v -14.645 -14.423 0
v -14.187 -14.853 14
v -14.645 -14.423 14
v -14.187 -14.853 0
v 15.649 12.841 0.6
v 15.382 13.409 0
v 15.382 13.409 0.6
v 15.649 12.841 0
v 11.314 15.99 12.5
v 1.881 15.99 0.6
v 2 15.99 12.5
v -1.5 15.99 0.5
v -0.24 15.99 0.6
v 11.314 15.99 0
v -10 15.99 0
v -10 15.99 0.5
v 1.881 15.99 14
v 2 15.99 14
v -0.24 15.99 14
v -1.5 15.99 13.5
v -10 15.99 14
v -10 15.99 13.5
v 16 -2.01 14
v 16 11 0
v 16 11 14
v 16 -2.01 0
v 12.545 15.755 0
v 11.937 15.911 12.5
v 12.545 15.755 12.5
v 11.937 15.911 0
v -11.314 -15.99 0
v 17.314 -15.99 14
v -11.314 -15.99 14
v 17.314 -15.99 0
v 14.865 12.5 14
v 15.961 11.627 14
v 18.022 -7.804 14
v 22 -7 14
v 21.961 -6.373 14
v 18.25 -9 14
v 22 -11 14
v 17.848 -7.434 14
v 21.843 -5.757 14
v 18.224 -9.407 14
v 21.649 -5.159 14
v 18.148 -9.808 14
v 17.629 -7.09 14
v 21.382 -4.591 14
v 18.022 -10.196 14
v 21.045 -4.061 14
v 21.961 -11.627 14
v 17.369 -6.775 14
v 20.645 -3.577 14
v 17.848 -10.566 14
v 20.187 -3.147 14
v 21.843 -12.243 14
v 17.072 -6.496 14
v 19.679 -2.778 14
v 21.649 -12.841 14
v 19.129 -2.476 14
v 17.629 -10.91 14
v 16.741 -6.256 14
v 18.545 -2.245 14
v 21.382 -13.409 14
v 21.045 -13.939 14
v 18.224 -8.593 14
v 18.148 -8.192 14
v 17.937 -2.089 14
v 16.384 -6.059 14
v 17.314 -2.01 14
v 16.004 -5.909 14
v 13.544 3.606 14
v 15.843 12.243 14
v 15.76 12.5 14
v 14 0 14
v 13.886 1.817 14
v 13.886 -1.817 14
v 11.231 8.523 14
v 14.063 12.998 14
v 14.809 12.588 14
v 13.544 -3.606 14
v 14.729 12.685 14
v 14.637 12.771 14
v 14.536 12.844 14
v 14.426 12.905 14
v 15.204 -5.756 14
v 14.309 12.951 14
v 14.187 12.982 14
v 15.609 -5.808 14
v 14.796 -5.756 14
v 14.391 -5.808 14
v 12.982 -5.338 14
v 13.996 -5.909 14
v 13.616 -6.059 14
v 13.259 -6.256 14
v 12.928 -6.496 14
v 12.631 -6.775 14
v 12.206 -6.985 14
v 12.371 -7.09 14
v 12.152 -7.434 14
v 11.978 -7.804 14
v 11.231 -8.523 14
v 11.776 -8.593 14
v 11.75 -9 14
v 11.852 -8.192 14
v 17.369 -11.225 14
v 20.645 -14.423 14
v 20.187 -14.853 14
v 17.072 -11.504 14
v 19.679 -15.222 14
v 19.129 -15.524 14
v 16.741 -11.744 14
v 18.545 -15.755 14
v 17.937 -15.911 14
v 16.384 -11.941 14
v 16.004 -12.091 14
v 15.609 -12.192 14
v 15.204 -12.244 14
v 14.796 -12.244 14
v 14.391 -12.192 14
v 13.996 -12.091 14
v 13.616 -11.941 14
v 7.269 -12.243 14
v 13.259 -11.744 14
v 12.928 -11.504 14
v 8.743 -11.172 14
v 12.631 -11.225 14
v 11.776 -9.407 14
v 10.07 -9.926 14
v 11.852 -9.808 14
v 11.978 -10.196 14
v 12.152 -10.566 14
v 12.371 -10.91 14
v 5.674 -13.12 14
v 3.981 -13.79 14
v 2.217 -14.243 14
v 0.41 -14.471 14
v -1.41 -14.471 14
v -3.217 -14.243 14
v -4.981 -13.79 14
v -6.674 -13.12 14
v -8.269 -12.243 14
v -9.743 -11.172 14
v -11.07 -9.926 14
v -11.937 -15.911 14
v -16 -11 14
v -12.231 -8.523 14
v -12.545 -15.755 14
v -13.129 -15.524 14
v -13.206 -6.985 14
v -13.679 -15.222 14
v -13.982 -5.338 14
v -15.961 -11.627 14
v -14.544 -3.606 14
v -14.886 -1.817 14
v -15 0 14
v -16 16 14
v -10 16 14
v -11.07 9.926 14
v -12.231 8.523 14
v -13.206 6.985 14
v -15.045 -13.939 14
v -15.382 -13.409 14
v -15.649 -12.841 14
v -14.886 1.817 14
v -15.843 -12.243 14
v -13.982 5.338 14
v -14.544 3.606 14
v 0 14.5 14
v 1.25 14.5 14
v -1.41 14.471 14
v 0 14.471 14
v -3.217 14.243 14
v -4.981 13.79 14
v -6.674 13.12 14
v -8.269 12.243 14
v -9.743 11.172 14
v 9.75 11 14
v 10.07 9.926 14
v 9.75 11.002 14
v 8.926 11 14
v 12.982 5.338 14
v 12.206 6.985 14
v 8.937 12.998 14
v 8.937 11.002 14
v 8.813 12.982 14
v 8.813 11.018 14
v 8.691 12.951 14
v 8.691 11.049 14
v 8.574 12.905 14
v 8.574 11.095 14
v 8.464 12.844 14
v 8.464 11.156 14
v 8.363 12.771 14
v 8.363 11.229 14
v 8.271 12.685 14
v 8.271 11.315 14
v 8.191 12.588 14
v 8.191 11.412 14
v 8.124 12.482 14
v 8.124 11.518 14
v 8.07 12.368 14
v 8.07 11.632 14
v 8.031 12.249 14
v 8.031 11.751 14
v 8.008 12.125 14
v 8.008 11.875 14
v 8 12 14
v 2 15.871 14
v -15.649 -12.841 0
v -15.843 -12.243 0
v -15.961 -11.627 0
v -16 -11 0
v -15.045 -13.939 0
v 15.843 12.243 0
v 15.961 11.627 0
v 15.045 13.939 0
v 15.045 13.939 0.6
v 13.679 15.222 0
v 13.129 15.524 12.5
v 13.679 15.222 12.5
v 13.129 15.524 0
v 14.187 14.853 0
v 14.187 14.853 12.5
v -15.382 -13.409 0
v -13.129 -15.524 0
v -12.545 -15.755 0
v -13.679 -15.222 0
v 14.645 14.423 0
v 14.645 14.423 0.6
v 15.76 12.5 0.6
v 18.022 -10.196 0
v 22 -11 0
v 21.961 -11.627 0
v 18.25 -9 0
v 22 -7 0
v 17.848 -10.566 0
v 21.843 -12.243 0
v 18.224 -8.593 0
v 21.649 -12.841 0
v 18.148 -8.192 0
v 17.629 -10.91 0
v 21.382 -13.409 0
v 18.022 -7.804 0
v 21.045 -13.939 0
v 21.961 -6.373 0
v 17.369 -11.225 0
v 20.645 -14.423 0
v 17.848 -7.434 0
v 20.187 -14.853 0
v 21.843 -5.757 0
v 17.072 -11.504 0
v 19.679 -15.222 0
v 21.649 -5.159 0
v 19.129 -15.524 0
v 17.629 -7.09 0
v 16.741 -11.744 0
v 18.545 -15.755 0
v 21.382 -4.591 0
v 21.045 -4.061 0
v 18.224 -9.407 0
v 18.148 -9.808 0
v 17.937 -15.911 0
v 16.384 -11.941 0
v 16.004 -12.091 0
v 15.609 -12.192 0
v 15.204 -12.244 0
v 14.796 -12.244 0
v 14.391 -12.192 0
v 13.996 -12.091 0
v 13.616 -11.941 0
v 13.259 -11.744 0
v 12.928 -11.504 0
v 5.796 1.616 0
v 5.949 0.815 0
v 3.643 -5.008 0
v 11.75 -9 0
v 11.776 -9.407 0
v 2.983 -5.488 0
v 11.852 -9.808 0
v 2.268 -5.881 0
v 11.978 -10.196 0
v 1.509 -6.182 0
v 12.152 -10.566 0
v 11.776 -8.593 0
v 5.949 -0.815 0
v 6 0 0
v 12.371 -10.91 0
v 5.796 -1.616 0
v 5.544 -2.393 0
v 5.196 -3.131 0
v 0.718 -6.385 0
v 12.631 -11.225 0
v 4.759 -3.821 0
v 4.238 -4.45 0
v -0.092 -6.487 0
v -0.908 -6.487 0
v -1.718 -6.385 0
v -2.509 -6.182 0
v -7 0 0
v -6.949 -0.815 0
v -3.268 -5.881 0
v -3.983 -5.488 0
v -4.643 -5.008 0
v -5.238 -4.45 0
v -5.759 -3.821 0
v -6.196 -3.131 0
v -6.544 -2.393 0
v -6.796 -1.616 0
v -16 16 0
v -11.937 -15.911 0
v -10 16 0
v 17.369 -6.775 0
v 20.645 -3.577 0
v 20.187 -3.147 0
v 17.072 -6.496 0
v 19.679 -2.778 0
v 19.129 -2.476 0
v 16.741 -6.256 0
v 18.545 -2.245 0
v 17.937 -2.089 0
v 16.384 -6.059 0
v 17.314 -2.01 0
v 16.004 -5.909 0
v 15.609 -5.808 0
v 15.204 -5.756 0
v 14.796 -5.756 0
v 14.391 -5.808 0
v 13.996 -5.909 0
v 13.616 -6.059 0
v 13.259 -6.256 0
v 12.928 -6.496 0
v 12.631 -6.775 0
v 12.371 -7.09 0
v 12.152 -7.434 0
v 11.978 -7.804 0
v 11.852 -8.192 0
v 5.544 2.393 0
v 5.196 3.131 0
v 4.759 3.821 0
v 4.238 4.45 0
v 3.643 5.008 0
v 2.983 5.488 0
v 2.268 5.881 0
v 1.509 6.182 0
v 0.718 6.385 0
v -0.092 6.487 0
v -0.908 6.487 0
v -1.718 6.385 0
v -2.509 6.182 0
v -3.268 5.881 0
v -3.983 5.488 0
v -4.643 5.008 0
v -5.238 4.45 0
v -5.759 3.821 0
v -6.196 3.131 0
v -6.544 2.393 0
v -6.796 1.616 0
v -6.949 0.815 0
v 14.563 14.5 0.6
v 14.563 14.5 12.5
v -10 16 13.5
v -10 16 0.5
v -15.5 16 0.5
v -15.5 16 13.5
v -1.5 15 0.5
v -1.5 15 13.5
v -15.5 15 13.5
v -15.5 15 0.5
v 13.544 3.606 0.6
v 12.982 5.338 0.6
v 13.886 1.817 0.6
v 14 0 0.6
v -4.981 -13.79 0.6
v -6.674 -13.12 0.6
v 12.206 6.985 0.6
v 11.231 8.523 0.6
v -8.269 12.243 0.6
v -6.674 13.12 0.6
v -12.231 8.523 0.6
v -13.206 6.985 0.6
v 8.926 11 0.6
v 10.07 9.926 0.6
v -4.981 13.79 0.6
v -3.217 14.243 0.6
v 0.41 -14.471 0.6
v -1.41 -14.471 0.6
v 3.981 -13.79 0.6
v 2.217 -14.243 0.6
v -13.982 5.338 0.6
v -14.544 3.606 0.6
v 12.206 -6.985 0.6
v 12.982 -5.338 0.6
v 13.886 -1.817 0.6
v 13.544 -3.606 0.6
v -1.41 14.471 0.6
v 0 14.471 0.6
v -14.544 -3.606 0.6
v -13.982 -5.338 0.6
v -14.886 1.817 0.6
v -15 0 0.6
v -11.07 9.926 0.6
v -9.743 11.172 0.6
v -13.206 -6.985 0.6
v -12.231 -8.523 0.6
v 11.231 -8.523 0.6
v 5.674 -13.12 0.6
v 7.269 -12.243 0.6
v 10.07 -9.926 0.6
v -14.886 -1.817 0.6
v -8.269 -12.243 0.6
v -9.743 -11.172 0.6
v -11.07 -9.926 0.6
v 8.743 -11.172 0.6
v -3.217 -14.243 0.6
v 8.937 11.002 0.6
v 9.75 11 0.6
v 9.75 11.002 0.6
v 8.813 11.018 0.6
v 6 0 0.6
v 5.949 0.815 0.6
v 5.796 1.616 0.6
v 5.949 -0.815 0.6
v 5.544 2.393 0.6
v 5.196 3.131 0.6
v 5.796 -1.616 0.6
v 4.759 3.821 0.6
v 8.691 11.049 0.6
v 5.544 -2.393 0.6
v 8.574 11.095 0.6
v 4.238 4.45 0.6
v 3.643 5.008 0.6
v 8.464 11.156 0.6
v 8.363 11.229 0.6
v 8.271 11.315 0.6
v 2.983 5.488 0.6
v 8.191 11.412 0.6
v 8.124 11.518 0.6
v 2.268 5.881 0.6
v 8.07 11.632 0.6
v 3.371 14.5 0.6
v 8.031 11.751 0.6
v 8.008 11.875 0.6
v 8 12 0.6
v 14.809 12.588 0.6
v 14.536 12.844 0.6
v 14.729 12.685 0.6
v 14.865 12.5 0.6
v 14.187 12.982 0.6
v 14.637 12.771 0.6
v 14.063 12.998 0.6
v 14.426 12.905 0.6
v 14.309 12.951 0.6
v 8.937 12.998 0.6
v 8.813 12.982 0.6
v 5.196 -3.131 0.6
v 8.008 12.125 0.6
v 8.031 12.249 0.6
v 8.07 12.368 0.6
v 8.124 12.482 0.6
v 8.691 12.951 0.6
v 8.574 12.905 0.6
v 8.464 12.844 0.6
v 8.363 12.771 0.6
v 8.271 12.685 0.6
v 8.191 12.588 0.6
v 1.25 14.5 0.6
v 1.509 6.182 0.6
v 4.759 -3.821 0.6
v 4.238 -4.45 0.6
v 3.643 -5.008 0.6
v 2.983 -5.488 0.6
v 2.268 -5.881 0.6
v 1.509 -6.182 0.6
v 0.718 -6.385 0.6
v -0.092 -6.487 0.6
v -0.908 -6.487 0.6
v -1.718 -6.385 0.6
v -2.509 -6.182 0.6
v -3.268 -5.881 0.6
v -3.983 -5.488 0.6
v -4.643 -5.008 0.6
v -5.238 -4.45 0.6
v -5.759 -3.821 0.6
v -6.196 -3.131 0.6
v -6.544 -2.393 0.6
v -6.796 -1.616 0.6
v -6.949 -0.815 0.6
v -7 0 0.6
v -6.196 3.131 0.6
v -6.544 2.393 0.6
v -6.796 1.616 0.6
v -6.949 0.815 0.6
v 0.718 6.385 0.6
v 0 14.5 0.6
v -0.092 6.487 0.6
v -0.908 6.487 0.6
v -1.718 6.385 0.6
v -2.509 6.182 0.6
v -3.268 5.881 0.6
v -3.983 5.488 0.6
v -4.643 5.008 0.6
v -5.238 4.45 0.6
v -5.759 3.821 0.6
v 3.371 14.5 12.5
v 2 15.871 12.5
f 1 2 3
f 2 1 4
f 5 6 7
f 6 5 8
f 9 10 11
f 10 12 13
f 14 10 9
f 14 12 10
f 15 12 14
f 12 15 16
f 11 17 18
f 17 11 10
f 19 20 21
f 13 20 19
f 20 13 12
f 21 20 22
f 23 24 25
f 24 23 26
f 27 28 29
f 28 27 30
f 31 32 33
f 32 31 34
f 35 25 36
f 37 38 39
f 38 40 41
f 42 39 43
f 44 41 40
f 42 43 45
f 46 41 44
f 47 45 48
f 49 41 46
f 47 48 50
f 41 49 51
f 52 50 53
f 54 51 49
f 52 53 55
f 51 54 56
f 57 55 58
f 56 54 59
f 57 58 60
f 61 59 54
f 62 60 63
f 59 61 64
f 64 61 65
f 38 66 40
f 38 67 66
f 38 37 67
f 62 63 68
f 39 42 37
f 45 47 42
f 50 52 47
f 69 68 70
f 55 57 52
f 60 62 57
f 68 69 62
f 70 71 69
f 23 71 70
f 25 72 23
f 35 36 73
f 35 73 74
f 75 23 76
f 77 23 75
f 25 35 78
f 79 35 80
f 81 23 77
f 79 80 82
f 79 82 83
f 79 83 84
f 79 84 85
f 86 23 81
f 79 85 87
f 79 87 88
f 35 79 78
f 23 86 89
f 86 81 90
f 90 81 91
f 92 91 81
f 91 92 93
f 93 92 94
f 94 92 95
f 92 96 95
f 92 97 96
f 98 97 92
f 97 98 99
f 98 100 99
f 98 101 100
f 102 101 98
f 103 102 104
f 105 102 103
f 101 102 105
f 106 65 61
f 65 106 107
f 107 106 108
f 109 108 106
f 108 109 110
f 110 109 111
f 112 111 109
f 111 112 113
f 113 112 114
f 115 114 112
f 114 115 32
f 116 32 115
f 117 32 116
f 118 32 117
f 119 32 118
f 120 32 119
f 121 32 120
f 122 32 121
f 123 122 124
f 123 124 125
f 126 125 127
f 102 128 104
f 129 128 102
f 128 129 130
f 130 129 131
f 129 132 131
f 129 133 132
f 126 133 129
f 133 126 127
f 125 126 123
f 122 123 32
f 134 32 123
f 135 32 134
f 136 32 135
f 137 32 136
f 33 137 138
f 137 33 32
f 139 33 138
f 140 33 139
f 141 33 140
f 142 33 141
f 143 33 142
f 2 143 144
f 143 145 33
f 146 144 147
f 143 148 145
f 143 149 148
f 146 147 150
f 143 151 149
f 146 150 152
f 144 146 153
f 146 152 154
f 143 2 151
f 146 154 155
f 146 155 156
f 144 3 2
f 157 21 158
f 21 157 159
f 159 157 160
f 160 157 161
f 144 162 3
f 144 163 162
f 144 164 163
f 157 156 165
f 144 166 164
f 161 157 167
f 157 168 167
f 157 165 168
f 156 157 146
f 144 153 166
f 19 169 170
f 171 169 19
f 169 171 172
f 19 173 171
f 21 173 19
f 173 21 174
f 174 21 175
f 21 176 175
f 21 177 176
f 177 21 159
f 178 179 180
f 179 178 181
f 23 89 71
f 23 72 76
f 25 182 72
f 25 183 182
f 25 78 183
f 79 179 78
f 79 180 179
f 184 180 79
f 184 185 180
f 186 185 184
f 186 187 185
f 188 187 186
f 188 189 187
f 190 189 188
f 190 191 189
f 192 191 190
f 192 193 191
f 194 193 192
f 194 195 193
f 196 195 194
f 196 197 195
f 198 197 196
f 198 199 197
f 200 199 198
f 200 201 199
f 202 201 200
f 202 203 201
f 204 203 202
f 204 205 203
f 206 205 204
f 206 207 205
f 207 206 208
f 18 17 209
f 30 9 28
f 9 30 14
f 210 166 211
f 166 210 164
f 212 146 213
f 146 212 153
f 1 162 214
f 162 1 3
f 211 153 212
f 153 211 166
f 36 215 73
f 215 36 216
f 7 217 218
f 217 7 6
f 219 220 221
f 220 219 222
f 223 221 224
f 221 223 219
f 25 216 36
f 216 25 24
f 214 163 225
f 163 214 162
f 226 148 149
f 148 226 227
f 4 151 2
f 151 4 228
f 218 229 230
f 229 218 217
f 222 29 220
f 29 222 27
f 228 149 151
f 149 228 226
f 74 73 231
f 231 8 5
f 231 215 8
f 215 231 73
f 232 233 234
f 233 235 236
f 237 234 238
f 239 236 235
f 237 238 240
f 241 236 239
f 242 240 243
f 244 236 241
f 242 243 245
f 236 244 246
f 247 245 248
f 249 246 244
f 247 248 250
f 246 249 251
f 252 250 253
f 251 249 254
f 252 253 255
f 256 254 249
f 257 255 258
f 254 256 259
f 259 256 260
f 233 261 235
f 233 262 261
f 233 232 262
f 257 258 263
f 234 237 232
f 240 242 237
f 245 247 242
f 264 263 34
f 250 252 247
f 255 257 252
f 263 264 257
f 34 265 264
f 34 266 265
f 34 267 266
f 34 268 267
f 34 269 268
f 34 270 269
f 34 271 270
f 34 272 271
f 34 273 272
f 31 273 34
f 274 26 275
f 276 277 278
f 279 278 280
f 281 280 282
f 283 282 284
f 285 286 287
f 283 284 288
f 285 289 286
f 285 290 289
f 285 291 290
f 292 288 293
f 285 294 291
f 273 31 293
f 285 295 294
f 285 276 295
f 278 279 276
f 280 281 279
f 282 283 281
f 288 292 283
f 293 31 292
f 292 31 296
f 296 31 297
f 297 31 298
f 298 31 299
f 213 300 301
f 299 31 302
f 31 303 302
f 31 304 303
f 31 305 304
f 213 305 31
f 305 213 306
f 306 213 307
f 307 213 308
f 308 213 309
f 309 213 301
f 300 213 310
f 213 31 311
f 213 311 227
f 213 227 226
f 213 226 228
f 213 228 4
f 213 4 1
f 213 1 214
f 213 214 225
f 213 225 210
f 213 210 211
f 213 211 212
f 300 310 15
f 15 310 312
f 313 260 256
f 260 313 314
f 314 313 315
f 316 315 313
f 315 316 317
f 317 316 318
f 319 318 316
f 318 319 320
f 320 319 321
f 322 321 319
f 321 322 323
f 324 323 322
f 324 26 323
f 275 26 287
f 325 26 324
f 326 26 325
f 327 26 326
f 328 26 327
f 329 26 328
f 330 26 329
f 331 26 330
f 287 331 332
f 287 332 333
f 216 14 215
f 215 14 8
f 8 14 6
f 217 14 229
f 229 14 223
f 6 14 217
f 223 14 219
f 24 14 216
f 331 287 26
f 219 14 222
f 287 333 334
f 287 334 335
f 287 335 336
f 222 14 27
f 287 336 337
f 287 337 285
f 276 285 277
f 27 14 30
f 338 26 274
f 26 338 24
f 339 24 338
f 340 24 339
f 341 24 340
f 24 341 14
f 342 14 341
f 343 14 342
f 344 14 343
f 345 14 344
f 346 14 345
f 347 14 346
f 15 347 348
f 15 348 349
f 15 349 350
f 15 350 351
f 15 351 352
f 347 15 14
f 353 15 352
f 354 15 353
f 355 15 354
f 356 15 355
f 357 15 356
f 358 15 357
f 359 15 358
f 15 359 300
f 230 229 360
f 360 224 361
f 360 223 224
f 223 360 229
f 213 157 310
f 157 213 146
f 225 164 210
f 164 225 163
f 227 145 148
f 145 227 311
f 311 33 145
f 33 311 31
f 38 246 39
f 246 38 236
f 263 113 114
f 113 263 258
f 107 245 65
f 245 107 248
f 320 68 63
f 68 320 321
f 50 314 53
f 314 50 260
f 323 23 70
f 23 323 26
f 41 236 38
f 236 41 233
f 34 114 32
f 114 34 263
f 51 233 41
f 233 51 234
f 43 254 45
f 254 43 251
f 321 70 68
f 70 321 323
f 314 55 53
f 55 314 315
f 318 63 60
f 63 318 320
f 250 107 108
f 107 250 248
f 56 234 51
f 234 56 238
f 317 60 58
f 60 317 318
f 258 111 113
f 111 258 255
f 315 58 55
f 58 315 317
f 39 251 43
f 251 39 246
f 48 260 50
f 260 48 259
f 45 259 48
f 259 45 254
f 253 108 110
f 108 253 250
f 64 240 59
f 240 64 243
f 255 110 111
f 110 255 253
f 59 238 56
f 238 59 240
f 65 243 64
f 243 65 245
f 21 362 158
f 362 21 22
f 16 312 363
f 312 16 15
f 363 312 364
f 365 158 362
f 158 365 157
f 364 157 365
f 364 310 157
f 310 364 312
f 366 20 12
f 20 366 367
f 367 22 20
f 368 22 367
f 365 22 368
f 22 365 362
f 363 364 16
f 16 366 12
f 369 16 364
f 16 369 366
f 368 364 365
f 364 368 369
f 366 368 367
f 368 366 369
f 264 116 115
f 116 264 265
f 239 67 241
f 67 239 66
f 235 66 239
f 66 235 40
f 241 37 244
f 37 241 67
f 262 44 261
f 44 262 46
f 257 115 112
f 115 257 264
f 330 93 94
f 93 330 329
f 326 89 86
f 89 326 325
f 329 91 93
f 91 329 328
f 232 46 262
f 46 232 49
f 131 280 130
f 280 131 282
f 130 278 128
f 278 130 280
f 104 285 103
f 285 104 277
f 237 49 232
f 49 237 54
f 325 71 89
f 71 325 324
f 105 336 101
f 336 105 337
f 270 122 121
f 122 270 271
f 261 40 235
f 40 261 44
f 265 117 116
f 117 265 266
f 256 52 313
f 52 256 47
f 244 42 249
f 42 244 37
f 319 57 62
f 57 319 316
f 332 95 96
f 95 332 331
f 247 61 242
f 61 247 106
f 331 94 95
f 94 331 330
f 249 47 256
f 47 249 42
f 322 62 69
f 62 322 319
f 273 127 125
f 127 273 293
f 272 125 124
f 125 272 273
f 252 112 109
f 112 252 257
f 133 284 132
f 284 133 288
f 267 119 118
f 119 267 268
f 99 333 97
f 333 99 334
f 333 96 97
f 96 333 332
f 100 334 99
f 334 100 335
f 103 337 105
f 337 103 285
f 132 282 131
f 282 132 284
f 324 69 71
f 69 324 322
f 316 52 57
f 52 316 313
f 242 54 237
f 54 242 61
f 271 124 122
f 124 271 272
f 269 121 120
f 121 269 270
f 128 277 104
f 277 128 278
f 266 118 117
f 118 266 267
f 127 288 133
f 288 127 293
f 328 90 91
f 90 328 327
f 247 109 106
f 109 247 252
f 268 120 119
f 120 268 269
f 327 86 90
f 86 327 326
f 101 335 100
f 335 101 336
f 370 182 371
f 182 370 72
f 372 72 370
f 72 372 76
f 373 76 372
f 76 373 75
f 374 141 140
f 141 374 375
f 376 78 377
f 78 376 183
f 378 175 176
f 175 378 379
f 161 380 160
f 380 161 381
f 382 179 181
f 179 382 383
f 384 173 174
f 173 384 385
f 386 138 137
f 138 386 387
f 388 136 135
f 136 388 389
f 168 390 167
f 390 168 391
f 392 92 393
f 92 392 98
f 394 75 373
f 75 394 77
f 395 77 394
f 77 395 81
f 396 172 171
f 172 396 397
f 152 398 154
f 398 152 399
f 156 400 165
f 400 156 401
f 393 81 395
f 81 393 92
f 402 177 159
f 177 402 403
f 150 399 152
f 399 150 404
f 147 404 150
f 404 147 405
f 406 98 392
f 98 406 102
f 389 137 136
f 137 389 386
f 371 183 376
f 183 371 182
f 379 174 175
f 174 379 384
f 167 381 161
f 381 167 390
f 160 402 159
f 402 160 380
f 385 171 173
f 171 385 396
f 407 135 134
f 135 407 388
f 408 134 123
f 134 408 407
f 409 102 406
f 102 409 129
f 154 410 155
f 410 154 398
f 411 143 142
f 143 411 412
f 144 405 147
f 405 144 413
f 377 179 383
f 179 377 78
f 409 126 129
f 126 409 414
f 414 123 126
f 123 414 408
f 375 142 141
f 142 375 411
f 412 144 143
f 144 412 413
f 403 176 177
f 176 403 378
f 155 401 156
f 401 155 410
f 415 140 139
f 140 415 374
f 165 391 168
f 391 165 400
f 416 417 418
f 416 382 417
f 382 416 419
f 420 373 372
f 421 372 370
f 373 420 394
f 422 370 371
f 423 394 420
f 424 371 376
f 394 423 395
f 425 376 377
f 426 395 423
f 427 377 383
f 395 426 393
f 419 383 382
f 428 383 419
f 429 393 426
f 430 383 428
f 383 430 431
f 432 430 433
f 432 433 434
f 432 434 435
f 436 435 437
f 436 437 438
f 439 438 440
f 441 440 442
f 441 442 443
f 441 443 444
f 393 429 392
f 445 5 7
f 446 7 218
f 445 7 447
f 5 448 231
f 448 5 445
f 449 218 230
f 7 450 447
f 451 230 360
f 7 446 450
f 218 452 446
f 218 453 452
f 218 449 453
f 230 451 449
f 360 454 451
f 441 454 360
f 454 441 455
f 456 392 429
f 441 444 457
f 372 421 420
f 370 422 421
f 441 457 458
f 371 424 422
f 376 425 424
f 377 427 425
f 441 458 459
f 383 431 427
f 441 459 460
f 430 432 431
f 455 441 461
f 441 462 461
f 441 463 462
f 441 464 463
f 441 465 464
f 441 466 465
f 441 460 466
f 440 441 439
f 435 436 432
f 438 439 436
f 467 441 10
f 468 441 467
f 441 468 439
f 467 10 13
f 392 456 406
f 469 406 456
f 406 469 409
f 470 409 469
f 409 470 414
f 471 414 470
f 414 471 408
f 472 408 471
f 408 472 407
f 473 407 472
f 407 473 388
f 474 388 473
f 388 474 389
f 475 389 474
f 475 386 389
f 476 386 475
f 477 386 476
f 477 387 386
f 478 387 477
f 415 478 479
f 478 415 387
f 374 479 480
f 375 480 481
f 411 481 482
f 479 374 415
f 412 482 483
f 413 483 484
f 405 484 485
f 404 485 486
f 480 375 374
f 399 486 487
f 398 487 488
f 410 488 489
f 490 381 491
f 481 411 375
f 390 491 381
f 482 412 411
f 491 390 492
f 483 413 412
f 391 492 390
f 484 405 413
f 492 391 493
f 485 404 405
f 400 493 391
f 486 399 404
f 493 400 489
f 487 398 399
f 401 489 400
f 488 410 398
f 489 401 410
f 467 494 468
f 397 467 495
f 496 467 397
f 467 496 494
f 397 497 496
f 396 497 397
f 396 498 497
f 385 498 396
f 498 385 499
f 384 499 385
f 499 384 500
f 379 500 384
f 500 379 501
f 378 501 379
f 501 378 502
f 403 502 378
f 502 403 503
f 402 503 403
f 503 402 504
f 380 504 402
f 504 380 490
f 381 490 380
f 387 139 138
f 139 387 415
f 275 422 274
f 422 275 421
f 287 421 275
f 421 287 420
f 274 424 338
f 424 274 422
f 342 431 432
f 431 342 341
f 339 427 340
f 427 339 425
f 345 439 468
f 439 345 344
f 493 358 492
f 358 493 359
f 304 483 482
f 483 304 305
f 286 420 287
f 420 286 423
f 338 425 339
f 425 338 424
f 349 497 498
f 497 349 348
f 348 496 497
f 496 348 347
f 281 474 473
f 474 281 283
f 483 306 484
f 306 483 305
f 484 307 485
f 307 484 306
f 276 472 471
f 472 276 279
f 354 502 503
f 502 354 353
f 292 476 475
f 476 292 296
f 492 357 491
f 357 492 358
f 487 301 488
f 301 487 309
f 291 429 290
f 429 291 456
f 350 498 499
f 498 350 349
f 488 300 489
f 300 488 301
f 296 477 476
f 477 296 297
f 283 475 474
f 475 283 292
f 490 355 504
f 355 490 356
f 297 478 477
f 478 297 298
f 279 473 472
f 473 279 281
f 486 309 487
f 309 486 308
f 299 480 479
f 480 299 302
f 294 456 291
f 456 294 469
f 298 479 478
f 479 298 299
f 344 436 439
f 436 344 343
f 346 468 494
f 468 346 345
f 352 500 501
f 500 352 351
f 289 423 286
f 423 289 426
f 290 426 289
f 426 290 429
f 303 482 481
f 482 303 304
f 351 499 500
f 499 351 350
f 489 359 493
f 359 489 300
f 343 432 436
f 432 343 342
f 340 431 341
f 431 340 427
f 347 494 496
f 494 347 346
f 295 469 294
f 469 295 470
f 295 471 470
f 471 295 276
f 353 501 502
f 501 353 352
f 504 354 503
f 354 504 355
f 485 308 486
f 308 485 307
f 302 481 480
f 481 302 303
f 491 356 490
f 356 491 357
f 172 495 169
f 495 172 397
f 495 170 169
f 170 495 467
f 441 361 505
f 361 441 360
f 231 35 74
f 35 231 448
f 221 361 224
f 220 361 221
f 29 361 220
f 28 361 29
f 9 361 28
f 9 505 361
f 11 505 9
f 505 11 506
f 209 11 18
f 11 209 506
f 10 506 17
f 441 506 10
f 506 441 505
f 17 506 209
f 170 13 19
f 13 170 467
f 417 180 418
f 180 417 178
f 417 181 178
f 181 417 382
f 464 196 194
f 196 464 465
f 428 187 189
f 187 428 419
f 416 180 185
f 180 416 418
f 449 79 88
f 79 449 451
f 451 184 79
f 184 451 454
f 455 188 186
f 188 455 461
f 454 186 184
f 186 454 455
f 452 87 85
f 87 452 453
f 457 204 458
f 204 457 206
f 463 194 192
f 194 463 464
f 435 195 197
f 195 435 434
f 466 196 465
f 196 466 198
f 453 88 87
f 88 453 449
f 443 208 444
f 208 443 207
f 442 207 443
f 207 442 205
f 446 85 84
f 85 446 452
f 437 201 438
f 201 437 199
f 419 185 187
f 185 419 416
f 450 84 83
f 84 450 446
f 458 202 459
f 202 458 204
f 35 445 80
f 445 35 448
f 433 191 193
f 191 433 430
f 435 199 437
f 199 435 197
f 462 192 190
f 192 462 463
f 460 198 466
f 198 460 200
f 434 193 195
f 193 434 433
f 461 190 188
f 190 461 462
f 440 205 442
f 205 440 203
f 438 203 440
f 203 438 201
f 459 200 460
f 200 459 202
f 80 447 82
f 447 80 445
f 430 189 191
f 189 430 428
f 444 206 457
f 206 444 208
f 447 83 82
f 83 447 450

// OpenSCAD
$fn = 50;


union() {
	difference() {
		union() {
			translate(v = [0, 0, 0]) {
				rotate(a = [0, 0, 0]) {
					hull() {
						translate(v = [-11.0000000000, 11.0000000000, 0]) {
							rotate(a = [0, 0, 0]) {
								translate(v = [0, 0, 0]) {
									rotate(a = [0, 0, 0]) {
										cylinder(h = 14, r = 5);
									}
								}
							}
						}
						translate(v = [11.0000000000, 11.0000000000, 0]) {
							rotate(a = [0, 0, 0]) {
								translate(v = [0, 0, 0]) {
									rotate(a = [0, 0, 0]) {
										cylinder(h = 14, r = 5);
									}
								}
							}
						}
						translate(v = [-11.0000000000, -11.0000000000, 0]) {
							rotate(a = [0, 0, 0]) {
								translate(v = [0, 0, 0]) {
									rotate(a = [0, 0, 0]) {
										cylinder(h = 14, r = 5);
									}
								}
							}
						}
						translate(v = [11.0000000000, -11.0000000000, 0]) {
							rotate(a = [0, 0, 0]) {
								translate(v = [0, 0, 0]) {
									rotate(a = [0, 0, 0]) {
										cylinder(h = 14, r = 5);
									}
								}
							}
						}
					}
				}
			}
			translate(v = [7.5000000000, -9.0000000000, 0]) {
				rotate(a = [0, 0, 0]) {
					hull() {
						translate(v = [-9.5000000000, 2.0000000000, 0]) {
							rotate(a = [0, 0, 0]) {
								translate(v = [0, 0, 0]) {
									rotate(a = [0, 0, 0]) {
										cylinder(h = 14, r = 5);
									}
								}
							}
						}
						translate(v = [9.5000000000, 2.0000000000, 0]) {
							rotate(a = [0, 0, 0]) {
								translate(v = [0, 0, 0]) {
									rotate(a = [0, 0, 0]) {
										cylinder(h = 14, r = 5);
									}
								}
							}
						}
						translate(v = [-9.5000000000, -2.0000000000, 0]) {
							rotate(a = [0, 0, 0]) {
								translate(v = [0, 0, 0]) {
									rotate(a = [0, 0, 0]) {
										cylinder(h = 14, r = 5);
									}
								}
							}
						}
						translate(v = [9.5000000000, -2.0000000000, 0]) {
							rotate(a = [0, 0, 0]) {
								translate(v = [0, 0, 0]) {
									rotate(a = [0, 0, 0]) {
										cylinder(h = 14, r = 5);
									}
								}
							}
						}
					}
				}
			}
			translate(v = [-16.0000000000, 10.0000000000, 0]) {
				rotate(a = [0, 0, 0]) {
					cube(size = [6, 6, 14]);
				}
			}
		}
		union() {
			translate(v = [-15.5000000000, 15.0000000000, 0.5000000000]) {
				rotate(a = [0, 0, 0]) {
					cube(size = [14, 1, 13.0000000000]);
				}
			}
			translate(v = [15.0000000000, -9.0000000000, -125.0000000000]) {
				rotate(a = [0, 0, 0]) {
					cylinder(h = 250, r = 3.2500000000);
				}
			}
			translate(v = [-0.5000000000, 0.0000000000, 0.6000000000]) {
				rotate(a = [0, 0, 0]) {
					cylinder(h = 16.4000000000, r = 14.5000000000);
				}
			}
			translate(v = [-0.5000000000, 0.0000000000, -7.0000000000]) {
				rotate(a = [0, 0, 0]) {
					cylinder(h = 14, r = 6.5000000000);
				}
			}
			translate(v = [0.0000000000, 12.5000000000, 0.6000000000]) {
				rotate(a = [0, 0, 0]) {
					cube(size = [16.0000000000, 2, 16.4000000000]);
				}
			}
			translate(v = [2.0000000000, 12.5000000000, 12.5000000000]) {
				rotate(a = [0, 0, 0]) {
					cube(size = [14.0000000000, 5, 1.5000000000]);
				}
			}
			translate(v = [-3.0000000000, 18.7500000000, 0.6000000000]) {
				rotate(a = [0, 0, -45]) {
					cube(size = [10, 1.5000000000, 16.4000000000]);
				}
			}
			translate(v = [2.2500000000, 11.0000000000, 0.6000000000]) {
				rotate(a = [0, 0, 0]) {
					cube(size = [7.5000000000, 2, 13.4000000000]);
				}
			}
		}
	}
	union() {
		translate(v = [11.5000000000, 12, 0]) {
			rotate(a = [0, 0, 0]) {
				hull() {
					translate(v = [2.5000000000, 0, 0]) {
						rotate(a = [0, 0, 0]) {
							translate(v = [0, 0, 0]) {
								rotate(a = [0, 0, 0]) {
									cylinder(h = 14, r = 1.0000000000);
								}
							}
						}
					}
					translate(v = [-2.5000000000, 0, 0]) {
						rotate(a = [0, 0, 0]) {
							translate(v = [0, 0, 0]) {
								rotate(a = [0, 0, 0]) {
									cylinder(h = 14, r = 1.0000000000);
								}
							}
						}
					}
				}
			}
		}
	}
}
